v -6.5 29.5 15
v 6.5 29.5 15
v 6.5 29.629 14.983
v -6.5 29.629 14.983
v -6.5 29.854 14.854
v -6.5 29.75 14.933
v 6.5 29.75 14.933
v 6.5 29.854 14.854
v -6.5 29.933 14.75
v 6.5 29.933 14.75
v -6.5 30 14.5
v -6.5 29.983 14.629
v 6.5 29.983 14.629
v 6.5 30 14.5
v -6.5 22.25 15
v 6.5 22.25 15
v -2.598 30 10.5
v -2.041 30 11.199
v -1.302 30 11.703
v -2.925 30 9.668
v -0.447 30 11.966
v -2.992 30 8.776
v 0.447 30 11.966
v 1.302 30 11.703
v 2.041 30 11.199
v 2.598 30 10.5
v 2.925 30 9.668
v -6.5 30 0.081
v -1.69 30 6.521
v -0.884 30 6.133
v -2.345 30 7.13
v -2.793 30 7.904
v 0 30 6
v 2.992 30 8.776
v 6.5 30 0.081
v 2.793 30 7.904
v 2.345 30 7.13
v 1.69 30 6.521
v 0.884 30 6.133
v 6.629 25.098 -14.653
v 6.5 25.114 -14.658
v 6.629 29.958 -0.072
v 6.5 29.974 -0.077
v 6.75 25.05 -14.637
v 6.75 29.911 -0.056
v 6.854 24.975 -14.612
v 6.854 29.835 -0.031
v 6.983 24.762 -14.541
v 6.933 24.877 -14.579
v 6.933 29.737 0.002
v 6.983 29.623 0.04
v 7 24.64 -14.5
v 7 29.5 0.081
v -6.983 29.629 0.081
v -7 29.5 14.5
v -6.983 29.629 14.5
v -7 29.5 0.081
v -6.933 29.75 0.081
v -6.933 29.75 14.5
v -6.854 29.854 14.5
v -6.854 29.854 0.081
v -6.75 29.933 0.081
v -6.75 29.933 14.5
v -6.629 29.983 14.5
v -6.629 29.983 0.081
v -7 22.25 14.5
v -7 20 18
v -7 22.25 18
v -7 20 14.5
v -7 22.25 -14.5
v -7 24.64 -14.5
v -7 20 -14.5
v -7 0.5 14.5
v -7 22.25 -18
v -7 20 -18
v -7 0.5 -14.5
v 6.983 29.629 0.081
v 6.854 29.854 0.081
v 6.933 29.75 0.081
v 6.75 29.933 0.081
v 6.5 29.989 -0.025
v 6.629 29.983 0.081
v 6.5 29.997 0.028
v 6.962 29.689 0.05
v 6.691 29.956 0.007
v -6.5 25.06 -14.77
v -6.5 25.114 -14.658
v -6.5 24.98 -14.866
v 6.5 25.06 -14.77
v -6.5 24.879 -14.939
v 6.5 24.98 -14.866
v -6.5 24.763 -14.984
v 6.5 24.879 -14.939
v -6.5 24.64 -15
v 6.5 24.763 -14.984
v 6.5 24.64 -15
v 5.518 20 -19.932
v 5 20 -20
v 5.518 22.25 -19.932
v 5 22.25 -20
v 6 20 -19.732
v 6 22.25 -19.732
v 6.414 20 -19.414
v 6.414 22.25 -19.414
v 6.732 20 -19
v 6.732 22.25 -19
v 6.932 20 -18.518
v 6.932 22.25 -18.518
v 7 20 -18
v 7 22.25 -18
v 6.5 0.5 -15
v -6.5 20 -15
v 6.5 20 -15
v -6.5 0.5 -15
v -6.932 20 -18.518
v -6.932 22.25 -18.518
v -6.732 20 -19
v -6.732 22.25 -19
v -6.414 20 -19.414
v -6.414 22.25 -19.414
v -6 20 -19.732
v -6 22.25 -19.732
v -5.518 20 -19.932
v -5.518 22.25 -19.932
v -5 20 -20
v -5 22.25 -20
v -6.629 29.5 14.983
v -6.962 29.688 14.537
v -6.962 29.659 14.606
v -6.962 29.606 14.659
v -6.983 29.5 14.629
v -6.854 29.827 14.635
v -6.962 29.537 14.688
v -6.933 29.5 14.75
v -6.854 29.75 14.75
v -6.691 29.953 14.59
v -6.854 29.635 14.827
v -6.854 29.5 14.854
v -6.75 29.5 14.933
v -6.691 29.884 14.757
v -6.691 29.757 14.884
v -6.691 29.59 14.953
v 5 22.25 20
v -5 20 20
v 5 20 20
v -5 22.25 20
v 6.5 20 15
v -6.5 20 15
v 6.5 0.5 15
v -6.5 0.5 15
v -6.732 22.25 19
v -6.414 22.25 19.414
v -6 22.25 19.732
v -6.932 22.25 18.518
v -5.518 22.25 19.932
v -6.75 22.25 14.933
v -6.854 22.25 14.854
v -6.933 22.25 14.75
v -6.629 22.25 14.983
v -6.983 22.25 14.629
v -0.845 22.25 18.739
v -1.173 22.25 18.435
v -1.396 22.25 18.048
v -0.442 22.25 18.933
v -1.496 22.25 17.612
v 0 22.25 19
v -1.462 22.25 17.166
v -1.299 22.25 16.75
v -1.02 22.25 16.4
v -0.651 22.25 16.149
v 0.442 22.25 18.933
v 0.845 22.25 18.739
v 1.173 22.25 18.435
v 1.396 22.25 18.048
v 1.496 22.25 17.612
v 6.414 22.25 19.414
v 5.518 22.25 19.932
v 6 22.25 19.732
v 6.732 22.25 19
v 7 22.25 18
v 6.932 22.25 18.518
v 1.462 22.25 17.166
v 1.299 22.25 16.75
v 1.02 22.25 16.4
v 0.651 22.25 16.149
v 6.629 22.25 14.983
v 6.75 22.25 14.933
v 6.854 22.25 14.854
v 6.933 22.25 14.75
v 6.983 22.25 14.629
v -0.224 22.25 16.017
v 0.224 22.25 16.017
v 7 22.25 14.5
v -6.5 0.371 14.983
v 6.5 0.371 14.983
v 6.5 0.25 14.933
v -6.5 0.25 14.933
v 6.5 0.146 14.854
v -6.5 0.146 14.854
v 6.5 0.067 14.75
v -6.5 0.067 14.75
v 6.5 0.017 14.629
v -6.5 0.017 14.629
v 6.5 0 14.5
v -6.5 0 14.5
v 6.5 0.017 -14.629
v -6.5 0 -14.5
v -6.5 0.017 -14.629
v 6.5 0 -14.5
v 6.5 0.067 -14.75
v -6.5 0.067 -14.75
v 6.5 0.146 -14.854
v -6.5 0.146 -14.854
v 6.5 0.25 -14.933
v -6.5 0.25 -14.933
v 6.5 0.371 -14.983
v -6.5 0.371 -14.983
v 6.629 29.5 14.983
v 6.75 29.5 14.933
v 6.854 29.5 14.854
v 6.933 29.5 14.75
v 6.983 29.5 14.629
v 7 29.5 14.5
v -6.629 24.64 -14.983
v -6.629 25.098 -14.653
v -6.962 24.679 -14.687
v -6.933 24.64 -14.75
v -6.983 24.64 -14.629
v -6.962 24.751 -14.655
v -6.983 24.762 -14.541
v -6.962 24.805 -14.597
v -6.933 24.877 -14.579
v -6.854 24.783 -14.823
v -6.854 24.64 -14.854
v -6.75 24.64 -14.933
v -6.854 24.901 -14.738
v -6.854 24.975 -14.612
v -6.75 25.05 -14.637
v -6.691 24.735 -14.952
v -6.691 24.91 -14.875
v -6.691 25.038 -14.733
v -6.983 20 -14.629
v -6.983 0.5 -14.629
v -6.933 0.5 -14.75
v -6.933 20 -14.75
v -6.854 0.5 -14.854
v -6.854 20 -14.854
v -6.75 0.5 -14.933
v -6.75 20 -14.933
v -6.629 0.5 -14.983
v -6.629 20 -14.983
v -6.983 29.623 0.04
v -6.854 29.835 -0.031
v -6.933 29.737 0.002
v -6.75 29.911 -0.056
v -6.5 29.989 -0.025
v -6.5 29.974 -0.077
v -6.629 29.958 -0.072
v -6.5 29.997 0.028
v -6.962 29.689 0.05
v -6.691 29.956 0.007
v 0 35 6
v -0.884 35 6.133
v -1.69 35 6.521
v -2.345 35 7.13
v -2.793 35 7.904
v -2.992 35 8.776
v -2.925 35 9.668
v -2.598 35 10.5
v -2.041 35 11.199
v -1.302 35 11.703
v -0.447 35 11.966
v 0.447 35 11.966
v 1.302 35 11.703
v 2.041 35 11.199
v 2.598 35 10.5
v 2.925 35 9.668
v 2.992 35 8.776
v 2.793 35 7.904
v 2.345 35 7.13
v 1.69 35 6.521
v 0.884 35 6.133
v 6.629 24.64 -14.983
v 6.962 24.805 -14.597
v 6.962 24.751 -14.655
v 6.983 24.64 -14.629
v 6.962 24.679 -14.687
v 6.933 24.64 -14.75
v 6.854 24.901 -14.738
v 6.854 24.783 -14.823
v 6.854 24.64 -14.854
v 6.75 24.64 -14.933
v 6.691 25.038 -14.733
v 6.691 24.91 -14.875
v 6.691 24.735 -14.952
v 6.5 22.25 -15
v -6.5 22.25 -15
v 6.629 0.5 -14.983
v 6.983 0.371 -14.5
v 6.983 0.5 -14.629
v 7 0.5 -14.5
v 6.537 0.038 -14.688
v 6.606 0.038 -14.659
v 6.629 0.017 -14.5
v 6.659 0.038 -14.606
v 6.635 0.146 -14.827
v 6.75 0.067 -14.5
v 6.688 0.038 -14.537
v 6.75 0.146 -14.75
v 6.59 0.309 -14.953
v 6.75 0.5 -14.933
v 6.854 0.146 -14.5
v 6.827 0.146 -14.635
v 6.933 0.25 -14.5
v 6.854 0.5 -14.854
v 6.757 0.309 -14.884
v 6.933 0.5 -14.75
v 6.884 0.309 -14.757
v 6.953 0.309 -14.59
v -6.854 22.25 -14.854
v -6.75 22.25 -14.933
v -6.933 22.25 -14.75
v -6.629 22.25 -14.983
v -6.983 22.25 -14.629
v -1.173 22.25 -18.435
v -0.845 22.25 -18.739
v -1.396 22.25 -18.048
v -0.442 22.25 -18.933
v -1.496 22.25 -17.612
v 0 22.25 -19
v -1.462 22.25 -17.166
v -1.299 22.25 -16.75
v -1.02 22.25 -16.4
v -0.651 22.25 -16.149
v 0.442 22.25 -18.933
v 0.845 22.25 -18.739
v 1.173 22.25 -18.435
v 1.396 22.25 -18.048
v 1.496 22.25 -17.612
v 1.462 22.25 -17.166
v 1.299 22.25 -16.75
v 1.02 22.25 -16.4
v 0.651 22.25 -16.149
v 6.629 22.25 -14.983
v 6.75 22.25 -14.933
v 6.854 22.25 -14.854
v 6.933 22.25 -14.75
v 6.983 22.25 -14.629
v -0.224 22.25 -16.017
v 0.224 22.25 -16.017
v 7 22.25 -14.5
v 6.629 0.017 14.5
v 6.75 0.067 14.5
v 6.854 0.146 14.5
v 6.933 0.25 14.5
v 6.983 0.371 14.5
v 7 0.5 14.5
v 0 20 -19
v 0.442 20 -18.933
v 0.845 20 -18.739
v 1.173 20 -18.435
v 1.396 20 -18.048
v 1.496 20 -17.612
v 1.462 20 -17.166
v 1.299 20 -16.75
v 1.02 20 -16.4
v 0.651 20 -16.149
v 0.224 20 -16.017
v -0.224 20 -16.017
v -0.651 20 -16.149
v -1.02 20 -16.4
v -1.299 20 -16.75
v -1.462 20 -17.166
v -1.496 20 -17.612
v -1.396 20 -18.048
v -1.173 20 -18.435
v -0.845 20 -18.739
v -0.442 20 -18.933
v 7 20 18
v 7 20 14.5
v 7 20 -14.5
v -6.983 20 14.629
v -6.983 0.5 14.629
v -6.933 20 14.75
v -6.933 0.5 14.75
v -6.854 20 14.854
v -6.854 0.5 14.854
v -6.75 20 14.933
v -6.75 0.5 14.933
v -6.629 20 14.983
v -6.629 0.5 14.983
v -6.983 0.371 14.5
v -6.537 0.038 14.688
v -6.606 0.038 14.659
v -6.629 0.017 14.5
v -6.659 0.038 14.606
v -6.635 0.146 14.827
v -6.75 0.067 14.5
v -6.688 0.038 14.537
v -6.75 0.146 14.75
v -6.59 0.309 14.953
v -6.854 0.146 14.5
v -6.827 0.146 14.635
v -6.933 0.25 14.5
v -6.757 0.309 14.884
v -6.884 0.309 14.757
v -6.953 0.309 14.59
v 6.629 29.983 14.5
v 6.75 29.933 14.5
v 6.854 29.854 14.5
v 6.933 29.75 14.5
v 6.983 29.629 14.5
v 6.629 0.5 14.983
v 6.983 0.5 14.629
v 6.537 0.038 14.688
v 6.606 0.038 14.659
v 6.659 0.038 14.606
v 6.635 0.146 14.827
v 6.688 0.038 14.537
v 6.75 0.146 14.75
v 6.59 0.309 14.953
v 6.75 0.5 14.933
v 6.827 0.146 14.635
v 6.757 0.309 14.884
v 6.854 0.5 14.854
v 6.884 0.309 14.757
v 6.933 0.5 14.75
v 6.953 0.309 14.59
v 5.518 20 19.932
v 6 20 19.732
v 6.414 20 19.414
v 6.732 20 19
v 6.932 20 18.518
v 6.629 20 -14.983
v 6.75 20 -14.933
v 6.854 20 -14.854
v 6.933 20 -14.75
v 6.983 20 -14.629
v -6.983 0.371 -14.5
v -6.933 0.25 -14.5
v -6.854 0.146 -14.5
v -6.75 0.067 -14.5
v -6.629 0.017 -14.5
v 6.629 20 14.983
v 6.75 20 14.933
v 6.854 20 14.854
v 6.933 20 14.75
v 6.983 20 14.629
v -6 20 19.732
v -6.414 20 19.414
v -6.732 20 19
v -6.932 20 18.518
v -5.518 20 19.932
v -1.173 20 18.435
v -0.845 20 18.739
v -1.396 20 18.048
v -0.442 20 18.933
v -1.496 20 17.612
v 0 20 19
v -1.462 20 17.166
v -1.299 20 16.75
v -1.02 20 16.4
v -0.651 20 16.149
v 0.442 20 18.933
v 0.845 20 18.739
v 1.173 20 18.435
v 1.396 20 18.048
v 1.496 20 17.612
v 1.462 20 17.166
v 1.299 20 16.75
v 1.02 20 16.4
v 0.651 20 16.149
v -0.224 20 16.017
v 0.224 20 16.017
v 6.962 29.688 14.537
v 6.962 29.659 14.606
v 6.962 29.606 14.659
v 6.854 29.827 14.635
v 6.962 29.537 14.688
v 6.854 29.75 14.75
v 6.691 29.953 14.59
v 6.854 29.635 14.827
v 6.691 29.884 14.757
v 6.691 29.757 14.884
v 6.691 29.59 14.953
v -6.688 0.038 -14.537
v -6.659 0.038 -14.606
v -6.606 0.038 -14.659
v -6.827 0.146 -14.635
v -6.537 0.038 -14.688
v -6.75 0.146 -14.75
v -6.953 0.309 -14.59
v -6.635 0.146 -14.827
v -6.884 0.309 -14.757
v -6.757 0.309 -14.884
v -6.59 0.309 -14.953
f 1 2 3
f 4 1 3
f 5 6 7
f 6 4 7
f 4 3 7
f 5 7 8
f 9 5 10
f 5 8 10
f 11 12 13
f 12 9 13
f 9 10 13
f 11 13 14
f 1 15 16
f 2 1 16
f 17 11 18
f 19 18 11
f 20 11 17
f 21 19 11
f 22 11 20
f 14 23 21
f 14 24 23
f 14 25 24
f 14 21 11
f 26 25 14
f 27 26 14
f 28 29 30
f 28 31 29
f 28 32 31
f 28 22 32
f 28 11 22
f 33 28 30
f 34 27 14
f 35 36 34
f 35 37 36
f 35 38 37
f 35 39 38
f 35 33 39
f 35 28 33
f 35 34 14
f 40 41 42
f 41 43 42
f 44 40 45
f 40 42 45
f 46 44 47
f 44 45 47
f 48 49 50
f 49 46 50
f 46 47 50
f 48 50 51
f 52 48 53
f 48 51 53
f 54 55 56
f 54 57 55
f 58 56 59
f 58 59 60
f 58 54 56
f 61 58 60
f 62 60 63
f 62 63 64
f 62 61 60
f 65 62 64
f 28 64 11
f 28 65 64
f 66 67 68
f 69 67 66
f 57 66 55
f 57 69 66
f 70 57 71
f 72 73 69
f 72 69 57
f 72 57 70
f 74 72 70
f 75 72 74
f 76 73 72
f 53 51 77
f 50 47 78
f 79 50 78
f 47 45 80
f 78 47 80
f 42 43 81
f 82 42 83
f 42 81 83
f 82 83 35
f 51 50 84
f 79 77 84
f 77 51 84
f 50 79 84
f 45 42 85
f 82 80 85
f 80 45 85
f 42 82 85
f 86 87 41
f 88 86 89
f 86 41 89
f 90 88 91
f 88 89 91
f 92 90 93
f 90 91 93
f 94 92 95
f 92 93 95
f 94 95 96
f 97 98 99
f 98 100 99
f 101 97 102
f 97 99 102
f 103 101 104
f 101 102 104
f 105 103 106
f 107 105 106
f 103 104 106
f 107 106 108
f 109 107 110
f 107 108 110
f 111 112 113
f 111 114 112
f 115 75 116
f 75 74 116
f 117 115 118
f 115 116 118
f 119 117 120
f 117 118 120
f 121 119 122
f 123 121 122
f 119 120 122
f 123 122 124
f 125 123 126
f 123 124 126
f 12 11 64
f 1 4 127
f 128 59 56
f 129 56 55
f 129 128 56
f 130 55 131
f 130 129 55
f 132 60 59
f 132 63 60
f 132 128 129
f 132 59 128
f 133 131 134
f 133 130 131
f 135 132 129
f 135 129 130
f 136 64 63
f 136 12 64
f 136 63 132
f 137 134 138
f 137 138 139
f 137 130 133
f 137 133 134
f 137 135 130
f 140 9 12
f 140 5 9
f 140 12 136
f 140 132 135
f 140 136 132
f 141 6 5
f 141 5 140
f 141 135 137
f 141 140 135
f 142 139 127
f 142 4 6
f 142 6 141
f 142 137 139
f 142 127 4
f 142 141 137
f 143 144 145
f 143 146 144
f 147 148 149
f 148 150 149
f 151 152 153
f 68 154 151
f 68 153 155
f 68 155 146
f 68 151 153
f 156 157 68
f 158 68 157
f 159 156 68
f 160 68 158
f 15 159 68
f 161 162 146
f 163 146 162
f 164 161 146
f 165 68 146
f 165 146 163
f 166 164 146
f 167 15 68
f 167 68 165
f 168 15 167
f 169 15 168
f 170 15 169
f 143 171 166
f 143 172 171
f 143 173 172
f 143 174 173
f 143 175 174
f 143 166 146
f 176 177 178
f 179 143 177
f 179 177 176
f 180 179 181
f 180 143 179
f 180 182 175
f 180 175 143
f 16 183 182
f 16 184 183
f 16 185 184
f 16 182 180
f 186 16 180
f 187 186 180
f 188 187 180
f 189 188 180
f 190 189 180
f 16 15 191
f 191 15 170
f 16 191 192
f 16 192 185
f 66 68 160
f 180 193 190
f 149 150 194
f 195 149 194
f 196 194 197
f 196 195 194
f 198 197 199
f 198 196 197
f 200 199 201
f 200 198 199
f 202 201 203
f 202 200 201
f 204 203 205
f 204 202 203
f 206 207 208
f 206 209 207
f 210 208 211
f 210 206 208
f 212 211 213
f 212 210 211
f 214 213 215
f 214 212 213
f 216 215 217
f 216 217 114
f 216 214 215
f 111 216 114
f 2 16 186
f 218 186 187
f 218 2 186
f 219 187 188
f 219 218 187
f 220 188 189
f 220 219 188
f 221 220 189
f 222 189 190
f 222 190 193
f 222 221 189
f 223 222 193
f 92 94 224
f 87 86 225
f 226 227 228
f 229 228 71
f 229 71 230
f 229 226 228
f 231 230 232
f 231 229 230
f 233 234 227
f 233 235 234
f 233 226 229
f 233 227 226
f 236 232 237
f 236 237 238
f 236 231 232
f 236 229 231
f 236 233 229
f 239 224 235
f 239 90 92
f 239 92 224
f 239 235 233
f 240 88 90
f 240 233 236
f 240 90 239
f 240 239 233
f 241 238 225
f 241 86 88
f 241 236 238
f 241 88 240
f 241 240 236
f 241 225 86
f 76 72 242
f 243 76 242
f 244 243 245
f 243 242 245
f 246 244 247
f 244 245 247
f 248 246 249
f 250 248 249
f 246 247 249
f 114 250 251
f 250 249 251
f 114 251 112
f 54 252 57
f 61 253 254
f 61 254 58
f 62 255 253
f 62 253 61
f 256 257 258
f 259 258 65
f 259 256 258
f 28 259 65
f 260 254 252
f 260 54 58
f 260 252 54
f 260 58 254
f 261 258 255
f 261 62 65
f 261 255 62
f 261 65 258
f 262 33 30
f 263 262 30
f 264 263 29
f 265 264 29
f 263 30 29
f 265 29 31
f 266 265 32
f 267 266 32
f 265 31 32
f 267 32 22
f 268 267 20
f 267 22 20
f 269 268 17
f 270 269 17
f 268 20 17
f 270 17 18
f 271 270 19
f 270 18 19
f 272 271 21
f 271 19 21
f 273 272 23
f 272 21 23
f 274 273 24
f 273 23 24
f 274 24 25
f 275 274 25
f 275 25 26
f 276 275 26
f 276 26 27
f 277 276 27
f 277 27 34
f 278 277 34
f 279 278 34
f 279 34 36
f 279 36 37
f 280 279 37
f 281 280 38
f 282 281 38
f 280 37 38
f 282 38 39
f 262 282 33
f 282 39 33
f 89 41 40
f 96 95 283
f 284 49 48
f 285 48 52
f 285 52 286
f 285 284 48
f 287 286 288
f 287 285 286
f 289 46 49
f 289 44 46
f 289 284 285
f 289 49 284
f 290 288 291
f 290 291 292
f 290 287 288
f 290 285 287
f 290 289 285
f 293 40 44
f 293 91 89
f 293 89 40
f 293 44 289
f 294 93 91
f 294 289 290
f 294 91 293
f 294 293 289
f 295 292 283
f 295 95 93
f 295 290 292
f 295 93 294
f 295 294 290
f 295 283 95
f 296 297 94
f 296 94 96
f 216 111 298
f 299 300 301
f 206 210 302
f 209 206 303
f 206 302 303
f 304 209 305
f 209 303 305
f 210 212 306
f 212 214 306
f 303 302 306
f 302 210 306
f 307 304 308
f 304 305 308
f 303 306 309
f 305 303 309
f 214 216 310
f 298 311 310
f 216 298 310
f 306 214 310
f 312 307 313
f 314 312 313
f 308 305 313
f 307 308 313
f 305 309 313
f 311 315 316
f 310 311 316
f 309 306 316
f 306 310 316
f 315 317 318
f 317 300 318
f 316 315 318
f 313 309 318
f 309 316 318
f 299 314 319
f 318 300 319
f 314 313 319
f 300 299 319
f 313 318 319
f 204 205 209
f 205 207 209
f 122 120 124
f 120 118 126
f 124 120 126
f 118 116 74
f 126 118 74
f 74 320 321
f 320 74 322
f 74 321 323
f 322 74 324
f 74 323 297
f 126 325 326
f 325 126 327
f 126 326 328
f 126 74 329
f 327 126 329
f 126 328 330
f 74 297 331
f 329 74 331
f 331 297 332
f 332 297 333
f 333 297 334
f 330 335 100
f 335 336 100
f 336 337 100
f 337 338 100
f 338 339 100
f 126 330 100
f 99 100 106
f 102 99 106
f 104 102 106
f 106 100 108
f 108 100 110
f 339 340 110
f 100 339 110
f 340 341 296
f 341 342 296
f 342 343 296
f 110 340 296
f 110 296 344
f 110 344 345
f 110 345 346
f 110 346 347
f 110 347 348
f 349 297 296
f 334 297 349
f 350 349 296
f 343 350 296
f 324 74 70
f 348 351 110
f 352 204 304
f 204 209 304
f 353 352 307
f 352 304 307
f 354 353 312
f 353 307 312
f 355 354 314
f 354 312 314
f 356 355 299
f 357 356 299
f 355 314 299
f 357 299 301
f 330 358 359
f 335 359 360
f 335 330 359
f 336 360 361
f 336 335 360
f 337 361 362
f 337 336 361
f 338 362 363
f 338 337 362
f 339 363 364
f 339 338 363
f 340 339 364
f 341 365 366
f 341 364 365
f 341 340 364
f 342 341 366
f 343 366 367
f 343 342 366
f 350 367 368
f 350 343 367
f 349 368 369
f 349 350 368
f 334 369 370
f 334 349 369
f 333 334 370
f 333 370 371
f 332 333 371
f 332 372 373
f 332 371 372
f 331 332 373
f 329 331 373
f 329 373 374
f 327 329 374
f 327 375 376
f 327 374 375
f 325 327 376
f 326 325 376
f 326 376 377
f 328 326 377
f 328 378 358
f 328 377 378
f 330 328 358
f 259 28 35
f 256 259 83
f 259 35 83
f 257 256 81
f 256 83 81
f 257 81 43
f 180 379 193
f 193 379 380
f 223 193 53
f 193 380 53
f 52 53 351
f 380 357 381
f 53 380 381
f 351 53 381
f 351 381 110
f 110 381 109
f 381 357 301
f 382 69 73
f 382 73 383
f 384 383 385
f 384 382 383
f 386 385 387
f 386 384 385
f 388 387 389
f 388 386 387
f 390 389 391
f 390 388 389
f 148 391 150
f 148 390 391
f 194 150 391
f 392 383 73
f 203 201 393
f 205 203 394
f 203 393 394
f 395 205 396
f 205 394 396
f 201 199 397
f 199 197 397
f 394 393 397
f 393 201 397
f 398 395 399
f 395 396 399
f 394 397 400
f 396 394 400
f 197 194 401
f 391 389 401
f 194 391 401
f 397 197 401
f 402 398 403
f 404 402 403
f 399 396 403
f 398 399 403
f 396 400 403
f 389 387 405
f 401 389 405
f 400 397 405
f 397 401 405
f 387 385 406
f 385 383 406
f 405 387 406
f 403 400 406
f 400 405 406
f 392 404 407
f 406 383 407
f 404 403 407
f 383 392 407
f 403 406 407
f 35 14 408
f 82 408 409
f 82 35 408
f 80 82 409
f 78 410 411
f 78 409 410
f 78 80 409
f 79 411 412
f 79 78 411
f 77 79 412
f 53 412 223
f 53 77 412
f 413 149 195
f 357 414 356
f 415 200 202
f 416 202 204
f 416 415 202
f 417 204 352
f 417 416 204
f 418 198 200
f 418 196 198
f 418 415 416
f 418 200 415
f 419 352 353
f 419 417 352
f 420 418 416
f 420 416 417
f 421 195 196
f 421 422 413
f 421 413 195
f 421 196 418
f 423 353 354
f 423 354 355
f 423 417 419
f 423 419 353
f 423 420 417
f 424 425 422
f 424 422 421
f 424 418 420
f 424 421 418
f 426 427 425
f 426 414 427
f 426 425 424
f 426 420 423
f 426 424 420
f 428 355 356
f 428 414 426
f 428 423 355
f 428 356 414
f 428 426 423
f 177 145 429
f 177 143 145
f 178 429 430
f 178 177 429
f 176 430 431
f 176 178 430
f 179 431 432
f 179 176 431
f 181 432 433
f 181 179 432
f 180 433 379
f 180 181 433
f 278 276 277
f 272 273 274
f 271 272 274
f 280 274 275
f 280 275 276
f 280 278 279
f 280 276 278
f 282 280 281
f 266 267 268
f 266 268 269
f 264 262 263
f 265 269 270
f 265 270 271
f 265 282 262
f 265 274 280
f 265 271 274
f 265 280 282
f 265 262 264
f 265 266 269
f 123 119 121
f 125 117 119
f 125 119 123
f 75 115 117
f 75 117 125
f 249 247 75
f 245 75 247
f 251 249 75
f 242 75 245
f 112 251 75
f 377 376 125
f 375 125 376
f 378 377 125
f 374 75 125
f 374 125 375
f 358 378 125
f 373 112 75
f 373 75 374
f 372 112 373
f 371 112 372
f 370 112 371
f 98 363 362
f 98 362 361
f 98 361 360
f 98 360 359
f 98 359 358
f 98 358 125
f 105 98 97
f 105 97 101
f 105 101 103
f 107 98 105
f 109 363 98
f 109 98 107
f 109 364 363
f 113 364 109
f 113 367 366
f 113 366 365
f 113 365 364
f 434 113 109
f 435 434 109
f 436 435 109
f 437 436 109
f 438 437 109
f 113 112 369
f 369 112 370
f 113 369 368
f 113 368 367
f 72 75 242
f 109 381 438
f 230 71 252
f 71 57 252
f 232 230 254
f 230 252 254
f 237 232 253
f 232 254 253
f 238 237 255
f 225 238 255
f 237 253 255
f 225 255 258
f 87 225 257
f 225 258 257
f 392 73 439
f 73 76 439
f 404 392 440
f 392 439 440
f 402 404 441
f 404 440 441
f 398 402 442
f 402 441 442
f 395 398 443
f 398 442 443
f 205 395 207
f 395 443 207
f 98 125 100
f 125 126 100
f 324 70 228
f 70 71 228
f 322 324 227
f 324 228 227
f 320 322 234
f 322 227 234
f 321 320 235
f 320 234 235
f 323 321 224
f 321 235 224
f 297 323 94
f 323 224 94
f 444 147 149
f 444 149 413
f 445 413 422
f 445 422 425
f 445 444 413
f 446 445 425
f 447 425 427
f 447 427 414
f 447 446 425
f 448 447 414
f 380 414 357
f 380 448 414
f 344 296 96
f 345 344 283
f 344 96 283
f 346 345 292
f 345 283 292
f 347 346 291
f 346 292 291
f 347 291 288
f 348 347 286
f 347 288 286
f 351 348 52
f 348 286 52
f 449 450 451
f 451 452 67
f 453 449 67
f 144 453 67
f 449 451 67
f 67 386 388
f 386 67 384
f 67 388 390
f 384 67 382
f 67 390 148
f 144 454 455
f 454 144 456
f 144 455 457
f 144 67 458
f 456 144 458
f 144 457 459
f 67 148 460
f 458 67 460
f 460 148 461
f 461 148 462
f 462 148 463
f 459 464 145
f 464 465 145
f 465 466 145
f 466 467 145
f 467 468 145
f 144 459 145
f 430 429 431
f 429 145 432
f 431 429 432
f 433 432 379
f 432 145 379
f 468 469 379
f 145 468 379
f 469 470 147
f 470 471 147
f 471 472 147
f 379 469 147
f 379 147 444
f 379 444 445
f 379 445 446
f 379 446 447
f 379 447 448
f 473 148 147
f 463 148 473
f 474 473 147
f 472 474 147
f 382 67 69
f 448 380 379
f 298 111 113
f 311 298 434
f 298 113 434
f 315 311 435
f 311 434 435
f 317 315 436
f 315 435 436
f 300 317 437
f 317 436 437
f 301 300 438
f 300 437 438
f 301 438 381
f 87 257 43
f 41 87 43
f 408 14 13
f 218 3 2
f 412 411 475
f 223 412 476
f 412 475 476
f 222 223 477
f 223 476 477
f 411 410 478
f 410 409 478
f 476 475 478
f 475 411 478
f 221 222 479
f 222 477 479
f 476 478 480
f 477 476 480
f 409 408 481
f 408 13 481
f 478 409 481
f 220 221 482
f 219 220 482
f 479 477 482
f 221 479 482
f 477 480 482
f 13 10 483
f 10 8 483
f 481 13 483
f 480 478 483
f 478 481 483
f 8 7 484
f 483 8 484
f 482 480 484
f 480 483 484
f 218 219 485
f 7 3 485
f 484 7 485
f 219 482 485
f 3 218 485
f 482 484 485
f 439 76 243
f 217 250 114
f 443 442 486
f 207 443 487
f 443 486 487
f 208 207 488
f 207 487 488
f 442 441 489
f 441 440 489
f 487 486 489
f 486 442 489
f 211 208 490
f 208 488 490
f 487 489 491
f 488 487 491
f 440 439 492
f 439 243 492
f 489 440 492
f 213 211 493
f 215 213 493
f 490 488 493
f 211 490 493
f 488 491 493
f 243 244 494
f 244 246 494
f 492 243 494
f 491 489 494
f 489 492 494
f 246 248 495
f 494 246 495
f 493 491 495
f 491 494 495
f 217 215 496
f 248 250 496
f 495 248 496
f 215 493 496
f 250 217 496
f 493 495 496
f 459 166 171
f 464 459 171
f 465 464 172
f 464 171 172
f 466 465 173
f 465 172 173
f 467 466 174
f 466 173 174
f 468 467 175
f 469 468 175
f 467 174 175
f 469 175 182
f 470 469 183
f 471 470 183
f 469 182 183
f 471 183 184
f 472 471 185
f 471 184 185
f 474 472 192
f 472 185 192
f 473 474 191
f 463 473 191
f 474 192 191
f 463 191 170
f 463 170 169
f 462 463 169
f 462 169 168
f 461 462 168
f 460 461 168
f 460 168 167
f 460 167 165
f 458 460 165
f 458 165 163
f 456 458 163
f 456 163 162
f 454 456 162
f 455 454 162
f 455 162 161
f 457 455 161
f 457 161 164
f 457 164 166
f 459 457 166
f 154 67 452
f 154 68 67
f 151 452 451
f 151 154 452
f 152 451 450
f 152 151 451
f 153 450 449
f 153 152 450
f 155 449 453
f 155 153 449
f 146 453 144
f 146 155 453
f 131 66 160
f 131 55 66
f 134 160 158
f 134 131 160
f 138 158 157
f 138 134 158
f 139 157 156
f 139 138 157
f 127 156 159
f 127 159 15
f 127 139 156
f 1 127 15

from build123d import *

# Parameters (mm, degrees)
SKETCH1_W           = 14
SKETCH1_H           = 30
BOSS_EXTRUDE1_DEPTH = 30
SKETCH2_W           = 14
SKETCH2_H           = 2.25
BOSS_EXTRUDE2_DEPTH = 5
SKETCH3_R           = 1.5
CUT_EXTRUDE1_DEPTH  = 31.725600076
SKETCH4_R           = 3
BOSS_EXTRUDE3_DEPTH = 5
CHAMFER1_SIZE       = 5
CHAMFER1_SIZE2      = 15
FILLET1_R           = 2
FILLET2_R           = 0.5


with BuildPart() as part:
    # Sketch1 → Boss-Extrude1 (new body)
    with BuildSketch(Plane(origin=(0, 0, 0), x_dir=(1, 0, 0), z_dir=(0, 1, 0))):
        Rectangle(SKETCH1_W, SKETCH1_H)
    extrude(amount=BOSS_EXTRUDE1_DEPTH)

    # Sketch2 → Boss-Extrude2 (add)
    with BuildSketch(Plane.XY.offset(15)):
        with Locations((0, 21.125)):
            Rectangle(SKETCH2_W, SKETCH2_H)
    boss_extrude2 = extrude(amount=BOSS_EXTRUDE2_DEPTH)

    # Sketch3 → Cut-Extrude1 (cut, through all)
    with BuildSketch(Plane(origin=(0, 22.25, 0), x_dir=(1, 0, 0), z_dir=(0, 1, 0))):
        with Locations(Location((0, -17.5, 0), (0, 0, 270))):
            Circle(SKETCH3_R)
    cut_extrude1 = extrude(amount=-CUT_EXTRUDE1_DEPTH, mode=Mode.SUBTRACT)

    # Mirror1: Boss-Extrude2, Cut-Extrude1 across plane
    add(boss_extrude2.mirror(Plane.XY))
    add(cut_extrude1.mirror(Plane.XY), mode=Mode.SUBTRACT)

    # Sketch4 → Boss-Extrude3 (add)
    with BuildSketch(Plane(origin=(0, 30, 0), x_dir=(1, 0, 0), z_dir=(0, 1, 0))):
        with Locations(Location((0, -9, 0), (0, 0, 90))):
            Circle(SKETCH4_R)
    extrude(amount=BOSS_EXTRUDE3_DEPTH)

    # Chamfer1
    chamfer1_edges = [part.edges().sort_by_distance(p)[0] for p in [
        (0, 30, -15),
    ]]
    chamfer1_side = [part.faces().sort_by_distance(p)[0] for p in [
        (0, 26.125, -15),
    ]]
    chamfer(chamfer1_edges, length=CHAMFER1_SIZE, length2=CHAMFER1_SIZE2, reference=chamfer1_side[0])

    # Fillet1
    fillet1_edges = [part.edges().sort_by_distance(p)[0] for p in [
        (-7, 21.125, 20),
        (7, 21.125, 20),
        (-7, 21.125, -20),
        (7, 21.125, -20),
    ]]
    fillet(fillet1_edges, radius=FILLET1_R)

    # Fillet2
    fillet2_edges = [part.edges().sort_by_distance(p)[0] for p in [
        (0, 30, 15),
        (7, 10, 15),
        (-7, 10, 15),
        (-7, 10, -15),
        (7, 10, -15),
        (7, 30, 7.5),
        (0, 0, 15),
        (-7, 0, 0),
        (0, 0, -15),
        (7, 0, 0),
        (-7, 30, 7.5),
        (0, 30, 0),
        (-7, 23.625, -15),
        (-7, 27.5, -7.5),
        (7, 23.625, -15),
        (0, 25, -15),
        (7, 27.5, -7.5),
        (7, 26.125, 15),
        (-7, 26.125, 15),
    ]]
    fillet(fillet2_edges, radius=FILLET2_R)


solid = part.part
